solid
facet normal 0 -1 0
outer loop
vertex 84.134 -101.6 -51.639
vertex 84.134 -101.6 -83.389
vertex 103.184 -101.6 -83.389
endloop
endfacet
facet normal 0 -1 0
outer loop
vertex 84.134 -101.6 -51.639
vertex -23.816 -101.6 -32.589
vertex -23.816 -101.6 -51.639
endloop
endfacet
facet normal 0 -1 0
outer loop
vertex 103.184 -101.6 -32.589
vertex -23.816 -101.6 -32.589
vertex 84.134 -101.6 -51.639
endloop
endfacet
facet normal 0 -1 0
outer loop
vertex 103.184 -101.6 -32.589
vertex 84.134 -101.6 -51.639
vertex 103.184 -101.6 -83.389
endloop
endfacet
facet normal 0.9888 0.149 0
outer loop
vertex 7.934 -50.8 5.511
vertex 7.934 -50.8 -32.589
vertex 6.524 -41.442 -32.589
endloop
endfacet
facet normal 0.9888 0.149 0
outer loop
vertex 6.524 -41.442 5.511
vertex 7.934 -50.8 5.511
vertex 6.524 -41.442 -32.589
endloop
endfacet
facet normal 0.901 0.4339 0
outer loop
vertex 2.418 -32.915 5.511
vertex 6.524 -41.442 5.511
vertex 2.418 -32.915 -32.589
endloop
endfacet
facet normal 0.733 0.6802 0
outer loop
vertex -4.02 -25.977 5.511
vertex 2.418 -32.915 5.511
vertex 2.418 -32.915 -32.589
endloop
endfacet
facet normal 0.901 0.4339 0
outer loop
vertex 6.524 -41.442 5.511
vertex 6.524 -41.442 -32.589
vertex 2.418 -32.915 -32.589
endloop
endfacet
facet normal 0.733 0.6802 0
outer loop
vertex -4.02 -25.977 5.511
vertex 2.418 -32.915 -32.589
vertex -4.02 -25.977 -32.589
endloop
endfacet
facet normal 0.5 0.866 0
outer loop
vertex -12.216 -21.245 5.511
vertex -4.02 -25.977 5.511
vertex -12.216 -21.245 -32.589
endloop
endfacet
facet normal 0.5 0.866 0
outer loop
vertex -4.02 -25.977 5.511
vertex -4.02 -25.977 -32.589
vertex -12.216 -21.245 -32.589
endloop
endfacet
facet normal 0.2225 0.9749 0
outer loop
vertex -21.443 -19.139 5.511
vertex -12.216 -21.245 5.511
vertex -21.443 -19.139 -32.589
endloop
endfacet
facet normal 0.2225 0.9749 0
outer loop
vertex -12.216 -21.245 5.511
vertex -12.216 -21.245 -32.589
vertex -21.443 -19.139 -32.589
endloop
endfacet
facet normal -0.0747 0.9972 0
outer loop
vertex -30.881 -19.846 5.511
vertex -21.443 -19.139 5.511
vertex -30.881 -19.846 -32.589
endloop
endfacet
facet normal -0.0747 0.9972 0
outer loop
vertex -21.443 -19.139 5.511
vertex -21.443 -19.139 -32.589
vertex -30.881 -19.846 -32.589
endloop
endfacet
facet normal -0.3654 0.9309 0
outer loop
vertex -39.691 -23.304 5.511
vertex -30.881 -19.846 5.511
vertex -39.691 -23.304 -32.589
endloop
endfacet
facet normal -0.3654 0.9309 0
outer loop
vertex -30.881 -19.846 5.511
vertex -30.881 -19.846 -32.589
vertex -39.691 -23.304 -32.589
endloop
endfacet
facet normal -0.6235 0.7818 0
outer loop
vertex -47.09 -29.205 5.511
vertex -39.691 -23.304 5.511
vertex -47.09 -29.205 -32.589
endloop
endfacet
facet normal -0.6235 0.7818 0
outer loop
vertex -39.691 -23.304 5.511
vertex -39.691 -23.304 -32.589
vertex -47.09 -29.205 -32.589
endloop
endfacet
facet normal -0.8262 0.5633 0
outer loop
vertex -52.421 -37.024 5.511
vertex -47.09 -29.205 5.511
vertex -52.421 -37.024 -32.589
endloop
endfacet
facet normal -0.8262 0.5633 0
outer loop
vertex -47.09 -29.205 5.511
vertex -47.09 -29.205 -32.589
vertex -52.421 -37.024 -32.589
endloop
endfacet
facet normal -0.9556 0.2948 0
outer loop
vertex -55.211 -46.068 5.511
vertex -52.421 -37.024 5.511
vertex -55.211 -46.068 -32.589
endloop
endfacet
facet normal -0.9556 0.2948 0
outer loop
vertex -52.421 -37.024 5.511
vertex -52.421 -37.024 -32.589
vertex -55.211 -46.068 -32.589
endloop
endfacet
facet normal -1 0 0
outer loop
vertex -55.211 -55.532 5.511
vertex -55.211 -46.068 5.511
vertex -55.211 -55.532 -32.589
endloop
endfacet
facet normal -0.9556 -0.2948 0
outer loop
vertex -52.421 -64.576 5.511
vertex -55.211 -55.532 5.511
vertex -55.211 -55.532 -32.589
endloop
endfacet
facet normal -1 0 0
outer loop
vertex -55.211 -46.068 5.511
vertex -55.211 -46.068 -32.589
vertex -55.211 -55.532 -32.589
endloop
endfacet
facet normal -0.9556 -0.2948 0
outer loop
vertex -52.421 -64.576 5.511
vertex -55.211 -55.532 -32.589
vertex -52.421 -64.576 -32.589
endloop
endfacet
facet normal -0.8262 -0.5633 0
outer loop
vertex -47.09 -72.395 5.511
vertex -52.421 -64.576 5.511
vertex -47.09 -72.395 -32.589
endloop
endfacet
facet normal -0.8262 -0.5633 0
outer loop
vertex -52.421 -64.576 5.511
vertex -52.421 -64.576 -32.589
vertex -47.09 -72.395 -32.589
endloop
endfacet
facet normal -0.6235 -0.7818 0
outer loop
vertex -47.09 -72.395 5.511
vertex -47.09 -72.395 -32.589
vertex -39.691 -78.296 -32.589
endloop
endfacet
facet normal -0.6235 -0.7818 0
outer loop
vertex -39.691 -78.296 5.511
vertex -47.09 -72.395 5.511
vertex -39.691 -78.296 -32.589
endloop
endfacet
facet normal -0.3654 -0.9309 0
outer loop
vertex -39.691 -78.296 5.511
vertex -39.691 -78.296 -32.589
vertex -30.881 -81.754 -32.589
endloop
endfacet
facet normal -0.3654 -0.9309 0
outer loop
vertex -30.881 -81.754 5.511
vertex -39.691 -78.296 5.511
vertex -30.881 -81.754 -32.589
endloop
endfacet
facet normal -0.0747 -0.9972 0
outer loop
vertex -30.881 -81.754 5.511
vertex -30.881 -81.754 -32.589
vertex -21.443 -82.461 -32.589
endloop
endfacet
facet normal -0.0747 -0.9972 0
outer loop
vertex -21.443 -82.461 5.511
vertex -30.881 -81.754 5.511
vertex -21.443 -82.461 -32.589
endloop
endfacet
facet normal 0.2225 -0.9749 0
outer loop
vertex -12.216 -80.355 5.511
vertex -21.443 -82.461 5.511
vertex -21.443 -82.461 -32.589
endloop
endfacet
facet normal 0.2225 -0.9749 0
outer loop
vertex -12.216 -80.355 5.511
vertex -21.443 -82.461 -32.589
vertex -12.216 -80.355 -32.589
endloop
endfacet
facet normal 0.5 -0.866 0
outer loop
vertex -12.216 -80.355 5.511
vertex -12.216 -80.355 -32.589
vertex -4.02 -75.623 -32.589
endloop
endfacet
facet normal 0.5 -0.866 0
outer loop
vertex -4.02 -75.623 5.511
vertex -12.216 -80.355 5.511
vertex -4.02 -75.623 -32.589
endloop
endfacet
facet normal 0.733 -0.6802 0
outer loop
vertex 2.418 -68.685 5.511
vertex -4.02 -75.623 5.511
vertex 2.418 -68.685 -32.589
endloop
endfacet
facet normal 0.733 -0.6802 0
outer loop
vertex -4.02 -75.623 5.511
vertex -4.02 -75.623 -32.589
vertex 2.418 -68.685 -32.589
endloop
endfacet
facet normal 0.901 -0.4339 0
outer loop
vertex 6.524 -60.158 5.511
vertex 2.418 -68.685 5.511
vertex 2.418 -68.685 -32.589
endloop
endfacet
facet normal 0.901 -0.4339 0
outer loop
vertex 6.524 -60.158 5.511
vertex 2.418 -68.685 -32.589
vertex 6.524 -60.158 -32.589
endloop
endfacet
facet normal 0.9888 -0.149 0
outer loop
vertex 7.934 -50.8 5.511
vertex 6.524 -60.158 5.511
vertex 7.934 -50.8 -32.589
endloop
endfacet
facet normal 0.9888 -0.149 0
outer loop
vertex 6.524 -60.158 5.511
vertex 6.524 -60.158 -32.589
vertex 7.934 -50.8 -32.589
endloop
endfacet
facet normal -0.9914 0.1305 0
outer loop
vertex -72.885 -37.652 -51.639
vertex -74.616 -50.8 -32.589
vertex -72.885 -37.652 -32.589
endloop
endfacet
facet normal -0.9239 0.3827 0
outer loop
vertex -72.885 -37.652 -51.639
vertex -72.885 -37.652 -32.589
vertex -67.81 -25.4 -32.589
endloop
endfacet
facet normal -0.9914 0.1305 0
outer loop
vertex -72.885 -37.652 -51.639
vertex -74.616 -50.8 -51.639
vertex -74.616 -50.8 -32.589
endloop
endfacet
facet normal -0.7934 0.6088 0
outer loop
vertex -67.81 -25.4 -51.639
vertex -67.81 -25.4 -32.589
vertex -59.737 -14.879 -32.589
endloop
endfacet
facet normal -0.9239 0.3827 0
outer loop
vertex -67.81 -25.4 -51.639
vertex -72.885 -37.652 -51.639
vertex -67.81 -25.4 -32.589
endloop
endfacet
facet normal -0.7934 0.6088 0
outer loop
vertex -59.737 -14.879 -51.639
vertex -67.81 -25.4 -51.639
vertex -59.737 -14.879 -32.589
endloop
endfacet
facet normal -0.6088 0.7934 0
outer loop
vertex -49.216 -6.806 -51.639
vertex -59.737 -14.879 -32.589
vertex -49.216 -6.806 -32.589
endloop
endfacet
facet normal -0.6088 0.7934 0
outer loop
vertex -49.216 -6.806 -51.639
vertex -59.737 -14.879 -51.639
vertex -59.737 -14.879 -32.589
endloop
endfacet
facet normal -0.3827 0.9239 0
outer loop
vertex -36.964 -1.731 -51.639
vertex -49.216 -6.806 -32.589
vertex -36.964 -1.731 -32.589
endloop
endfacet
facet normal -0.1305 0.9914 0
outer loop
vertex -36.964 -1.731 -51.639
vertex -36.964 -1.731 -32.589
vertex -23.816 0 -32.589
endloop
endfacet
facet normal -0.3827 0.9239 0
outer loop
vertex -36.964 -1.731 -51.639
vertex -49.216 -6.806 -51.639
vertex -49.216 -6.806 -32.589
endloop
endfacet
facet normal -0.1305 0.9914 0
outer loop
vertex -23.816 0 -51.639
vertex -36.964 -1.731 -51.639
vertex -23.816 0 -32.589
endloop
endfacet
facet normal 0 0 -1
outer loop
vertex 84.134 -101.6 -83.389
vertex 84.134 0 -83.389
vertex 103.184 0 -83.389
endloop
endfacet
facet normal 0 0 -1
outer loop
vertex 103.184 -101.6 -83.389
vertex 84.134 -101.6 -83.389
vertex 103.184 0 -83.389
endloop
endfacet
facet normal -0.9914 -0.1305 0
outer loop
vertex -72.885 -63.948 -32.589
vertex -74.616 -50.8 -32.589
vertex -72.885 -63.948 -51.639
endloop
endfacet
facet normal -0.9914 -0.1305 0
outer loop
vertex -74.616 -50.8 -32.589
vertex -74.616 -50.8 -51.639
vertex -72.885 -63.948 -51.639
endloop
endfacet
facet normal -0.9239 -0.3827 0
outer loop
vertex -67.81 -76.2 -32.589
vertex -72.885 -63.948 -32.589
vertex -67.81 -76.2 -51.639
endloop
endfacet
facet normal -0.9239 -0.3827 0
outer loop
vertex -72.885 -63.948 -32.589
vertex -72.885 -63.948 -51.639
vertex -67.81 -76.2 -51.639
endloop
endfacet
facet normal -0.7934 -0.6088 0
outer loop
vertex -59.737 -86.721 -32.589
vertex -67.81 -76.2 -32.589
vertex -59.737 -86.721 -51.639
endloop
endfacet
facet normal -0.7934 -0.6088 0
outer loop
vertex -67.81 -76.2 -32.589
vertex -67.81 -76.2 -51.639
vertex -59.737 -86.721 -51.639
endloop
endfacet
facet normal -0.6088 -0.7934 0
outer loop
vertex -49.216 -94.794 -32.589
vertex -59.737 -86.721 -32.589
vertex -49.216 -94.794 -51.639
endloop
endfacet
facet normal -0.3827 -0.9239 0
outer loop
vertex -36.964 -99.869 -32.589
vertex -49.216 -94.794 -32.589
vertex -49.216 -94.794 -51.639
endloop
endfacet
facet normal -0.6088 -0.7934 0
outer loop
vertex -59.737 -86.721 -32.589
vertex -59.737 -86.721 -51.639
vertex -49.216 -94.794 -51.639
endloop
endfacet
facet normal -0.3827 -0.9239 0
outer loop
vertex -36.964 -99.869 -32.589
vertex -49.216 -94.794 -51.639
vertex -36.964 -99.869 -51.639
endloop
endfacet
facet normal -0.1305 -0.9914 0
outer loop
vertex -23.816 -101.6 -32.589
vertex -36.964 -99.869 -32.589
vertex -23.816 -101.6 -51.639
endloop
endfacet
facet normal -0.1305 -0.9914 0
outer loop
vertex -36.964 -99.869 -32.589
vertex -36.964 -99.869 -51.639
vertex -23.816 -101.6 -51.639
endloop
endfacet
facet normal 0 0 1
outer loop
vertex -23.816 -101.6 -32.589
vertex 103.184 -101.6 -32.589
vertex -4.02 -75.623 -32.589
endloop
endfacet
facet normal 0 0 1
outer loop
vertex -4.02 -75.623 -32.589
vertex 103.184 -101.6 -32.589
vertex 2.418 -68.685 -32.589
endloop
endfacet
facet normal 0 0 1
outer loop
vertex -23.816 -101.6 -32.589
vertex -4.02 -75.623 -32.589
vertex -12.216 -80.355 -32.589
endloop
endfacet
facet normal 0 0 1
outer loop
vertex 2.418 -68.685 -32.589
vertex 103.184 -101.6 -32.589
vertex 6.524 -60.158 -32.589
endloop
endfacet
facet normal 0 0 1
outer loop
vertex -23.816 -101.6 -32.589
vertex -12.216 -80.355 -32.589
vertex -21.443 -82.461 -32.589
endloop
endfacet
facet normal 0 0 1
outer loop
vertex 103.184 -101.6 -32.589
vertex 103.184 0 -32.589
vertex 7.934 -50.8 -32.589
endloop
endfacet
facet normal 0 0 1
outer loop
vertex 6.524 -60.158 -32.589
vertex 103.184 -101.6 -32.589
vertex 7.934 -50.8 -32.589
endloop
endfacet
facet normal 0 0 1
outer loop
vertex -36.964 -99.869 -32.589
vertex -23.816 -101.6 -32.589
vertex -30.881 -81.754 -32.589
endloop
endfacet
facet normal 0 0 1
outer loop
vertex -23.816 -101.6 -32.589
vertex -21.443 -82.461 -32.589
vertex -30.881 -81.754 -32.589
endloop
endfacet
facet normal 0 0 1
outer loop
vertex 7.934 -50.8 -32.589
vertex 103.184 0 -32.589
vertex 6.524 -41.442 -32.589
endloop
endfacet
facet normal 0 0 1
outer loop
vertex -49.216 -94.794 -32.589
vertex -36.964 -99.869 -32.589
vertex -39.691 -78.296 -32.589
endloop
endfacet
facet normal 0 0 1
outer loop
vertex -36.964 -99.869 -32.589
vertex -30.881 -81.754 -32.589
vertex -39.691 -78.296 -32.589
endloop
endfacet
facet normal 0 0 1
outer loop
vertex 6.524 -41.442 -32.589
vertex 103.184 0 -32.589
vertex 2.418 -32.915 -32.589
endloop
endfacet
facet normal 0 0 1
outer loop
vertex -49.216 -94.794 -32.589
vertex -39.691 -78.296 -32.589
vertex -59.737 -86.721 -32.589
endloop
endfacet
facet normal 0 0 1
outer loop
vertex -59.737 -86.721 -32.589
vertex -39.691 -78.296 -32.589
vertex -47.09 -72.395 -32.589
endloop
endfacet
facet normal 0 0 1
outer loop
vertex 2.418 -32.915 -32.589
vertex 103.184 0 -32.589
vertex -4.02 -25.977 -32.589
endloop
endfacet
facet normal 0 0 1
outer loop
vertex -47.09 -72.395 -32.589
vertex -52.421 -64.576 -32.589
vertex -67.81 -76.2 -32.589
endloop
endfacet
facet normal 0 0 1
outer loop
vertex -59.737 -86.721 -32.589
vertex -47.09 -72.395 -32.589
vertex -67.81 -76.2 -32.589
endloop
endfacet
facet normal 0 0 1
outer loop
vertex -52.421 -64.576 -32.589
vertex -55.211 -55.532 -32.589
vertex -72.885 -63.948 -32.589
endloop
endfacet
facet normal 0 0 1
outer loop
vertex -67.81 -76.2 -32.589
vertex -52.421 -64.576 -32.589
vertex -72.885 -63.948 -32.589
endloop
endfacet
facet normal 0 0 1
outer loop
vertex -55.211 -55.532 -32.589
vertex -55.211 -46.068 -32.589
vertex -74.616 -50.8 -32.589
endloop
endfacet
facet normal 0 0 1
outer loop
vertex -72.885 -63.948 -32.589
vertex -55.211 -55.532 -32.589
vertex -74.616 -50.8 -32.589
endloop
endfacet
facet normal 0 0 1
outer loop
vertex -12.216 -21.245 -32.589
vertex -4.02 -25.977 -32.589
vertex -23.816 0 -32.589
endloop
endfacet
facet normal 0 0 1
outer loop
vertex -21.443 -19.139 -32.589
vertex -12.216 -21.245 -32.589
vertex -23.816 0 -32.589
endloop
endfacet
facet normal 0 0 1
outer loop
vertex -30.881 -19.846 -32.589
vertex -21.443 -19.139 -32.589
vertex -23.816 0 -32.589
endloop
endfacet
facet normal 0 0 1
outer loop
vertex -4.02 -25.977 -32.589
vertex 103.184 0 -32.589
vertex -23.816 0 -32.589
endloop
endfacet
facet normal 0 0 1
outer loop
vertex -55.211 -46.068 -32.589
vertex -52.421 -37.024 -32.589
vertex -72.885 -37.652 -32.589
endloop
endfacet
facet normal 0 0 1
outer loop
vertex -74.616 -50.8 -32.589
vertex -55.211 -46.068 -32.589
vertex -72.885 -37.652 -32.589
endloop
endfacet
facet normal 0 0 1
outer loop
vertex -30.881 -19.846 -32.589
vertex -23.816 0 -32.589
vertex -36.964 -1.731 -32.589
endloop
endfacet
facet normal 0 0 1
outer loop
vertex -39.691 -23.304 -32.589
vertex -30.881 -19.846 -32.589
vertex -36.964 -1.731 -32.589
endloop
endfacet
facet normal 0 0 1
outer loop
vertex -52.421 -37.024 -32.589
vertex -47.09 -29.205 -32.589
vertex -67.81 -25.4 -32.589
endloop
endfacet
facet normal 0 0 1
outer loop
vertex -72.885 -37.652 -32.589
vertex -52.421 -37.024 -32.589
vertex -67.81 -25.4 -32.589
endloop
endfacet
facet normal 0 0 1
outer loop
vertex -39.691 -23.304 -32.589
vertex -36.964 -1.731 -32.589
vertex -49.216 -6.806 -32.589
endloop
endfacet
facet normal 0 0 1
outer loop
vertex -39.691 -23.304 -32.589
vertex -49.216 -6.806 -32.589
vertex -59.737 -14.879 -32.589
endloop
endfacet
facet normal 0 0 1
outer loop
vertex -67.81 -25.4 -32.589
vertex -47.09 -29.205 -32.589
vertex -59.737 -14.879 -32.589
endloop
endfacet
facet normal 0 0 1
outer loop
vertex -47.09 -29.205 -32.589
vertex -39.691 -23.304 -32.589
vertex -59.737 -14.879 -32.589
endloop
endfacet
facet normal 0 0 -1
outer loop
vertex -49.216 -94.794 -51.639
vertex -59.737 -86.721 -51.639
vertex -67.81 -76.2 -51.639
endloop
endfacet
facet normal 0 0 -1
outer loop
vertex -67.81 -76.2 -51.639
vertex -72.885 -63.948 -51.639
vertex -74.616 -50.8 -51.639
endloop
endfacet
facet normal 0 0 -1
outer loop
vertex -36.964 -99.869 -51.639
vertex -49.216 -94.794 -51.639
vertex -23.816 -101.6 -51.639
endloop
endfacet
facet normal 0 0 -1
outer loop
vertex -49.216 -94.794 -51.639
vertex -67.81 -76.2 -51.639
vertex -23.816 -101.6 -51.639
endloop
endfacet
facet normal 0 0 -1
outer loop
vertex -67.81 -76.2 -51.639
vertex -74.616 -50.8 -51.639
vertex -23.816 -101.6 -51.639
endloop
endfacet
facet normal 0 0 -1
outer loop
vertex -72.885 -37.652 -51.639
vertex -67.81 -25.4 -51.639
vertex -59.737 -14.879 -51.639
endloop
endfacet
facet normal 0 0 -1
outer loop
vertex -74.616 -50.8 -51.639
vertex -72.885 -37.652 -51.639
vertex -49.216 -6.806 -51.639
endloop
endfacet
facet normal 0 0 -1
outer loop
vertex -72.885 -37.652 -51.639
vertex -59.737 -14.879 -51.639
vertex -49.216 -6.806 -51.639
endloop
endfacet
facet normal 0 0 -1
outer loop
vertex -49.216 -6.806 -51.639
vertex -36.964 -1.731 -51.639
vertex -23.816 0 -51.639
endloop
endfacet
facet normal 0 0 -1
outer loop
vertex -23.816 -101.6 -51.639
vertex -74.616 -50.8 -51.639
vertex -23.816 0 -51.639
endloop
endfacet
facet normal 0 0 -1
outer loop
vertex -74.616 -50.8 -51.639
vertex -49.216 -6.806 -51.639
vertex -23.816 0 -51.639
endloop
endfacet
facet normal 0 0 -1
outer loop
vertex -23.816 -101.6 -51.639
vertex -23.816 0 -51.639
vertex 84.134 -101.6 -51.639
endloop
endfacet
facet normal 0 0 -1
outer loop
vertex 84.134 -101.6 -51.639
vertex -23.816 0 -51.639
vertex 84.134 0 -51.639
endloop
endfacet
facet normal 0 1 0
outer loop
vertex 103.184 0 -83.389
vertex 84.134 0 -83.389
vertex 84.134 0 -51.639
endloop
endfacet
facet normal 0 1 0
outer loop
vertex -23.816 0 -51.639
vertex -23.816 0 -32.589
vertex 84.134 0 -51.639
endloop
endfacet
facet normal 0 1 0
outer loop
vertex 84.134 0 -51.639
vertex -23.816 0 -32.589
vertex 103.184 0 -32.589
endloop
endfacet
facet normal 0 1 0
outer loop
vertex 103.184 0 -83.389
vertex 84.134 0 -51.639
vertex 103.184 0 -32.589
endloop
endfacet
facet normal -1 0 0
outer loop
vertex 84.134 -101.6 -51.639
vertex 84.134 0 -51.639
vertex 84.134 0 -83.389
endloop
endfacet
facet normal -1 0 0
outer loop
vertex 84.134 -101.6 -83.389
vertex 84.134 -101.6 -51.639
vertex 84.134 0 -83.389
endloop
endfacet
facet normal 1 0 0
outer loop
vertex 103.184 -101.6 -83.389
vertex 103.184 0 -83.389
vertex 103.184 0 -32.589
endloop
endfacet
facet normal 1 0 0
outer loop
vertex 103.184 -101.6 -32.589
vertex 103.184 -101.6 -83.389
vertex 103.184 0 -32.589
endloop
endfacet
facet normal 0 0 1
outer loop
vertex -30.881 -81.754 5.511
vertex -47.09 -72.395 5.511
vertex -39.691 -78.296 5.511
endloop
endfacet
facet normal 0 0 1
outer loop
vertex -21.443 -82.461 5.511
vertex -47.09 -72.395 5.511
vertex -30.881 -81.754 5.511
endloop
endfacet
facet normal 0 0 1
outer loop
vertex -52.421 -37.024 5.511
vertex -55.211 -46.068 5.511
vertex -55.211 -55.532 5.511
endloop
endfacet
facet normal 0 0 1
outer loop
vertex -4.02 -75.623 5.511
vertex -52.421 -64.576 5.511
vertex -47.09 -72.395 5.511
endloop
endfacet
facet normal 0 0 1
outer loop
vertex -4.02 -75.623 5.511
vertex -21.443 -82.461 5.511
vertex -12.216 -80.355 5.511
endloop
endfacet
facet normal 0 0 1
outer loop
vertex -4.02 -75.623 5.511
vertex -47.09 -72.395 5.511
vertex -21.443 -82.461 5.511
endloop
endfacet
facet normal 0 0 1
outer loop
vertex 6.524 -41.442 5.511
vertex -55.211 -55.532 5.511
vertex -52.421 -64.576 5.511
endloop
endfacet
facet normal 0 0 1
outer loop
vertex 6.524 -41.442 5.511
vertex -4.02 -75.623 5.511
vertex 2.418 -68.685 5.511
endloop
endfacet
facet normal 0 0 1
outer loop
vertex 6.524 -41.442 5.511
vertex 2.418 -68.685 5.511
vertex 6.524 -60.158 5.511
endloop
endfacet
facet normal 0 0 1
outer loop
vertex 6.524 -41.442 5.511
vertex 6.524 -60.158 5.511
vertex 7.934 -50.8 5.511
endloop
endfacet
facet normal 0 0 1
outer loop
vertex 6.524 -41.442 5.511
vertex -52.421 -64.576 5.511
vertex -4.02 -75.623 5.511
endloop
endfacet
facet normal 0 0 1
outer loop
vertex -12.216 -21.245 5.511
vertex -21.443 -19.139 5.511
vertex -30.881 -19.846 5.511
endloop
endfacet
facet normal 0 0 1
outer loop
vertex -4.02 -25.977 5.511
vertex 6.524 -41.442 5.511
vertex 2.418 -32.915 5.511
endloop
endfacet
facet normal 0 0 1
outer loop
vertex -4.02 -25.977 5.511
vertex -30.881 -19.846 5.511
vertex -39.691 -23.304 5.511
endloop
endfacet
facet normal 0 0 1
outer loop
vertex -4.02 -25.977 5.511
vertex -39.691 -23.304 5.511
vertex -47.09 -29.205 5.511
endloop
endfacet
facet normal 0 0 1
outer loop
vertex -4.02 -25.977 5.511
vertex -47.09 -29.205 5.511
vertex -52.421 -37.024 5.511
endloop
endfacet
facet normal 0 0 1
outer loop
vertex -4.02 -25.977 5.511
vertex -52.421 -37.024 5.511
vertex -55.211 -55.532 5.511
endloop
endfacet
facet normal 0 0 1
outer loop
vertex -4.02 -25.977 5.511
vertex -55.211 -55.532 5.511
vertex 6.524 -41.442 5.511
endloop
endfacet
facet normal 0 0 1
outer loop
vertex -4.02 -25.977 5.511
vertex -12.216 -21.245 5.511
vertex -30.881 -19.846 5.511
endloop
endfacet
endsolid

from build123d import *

# Parameters (mm, degrees)
F1_DEPTH = 101.6
F2_R     = 50.79999
F3_R     = 31.75
F4_DEPTH = 38.1


# Not quite as in the source:
# - a fillet or chamfer is up to 0.001 mm smaller than in the source, because OpenCascade refuses the exact size
# - the program builds the solid bodies; features that only make, move or delete a surface that nothing else refers to are left out


with BuildPart() as f1:
    # F0 (on Front) → F1 (new body)
    with BuildSketch(Plane.XZ):
        Polygon((-74.6155765653, -32.5891098499), (-74.6155765653, -51.6391098499), (84.1344234347, -51.6391098499), (84.1344234347, -79.0963023901), (84.1344234347, -83.3891098499), (103.1844234347, -83.3891098499), (103.1844234347, -32.5891098499), align=None)
    extrude(amount=F1_DEPTH)

    # F2 (radius 50.8 in the source; OpenCascade refuses exactly that, so slightly less here)
    f2_edges = [f1.edges().sort_by_distance(p)[0] for p in [
        (-74.615577, 0, -42.11411),
        (-74.615577, -101.6, -42.11411),
    ]]
    fillet(f2_edges, radius=F2_R)

    # F3 (on face) → F4 (join)
    with BuildSketch(Plane.XY.offset(-32.5891098499)):
        with Locations((-23.8155765653, -50.8)):
            Circle(F3_R)
    extrude(amount=F4_DEPTH)


solid = f1.part
